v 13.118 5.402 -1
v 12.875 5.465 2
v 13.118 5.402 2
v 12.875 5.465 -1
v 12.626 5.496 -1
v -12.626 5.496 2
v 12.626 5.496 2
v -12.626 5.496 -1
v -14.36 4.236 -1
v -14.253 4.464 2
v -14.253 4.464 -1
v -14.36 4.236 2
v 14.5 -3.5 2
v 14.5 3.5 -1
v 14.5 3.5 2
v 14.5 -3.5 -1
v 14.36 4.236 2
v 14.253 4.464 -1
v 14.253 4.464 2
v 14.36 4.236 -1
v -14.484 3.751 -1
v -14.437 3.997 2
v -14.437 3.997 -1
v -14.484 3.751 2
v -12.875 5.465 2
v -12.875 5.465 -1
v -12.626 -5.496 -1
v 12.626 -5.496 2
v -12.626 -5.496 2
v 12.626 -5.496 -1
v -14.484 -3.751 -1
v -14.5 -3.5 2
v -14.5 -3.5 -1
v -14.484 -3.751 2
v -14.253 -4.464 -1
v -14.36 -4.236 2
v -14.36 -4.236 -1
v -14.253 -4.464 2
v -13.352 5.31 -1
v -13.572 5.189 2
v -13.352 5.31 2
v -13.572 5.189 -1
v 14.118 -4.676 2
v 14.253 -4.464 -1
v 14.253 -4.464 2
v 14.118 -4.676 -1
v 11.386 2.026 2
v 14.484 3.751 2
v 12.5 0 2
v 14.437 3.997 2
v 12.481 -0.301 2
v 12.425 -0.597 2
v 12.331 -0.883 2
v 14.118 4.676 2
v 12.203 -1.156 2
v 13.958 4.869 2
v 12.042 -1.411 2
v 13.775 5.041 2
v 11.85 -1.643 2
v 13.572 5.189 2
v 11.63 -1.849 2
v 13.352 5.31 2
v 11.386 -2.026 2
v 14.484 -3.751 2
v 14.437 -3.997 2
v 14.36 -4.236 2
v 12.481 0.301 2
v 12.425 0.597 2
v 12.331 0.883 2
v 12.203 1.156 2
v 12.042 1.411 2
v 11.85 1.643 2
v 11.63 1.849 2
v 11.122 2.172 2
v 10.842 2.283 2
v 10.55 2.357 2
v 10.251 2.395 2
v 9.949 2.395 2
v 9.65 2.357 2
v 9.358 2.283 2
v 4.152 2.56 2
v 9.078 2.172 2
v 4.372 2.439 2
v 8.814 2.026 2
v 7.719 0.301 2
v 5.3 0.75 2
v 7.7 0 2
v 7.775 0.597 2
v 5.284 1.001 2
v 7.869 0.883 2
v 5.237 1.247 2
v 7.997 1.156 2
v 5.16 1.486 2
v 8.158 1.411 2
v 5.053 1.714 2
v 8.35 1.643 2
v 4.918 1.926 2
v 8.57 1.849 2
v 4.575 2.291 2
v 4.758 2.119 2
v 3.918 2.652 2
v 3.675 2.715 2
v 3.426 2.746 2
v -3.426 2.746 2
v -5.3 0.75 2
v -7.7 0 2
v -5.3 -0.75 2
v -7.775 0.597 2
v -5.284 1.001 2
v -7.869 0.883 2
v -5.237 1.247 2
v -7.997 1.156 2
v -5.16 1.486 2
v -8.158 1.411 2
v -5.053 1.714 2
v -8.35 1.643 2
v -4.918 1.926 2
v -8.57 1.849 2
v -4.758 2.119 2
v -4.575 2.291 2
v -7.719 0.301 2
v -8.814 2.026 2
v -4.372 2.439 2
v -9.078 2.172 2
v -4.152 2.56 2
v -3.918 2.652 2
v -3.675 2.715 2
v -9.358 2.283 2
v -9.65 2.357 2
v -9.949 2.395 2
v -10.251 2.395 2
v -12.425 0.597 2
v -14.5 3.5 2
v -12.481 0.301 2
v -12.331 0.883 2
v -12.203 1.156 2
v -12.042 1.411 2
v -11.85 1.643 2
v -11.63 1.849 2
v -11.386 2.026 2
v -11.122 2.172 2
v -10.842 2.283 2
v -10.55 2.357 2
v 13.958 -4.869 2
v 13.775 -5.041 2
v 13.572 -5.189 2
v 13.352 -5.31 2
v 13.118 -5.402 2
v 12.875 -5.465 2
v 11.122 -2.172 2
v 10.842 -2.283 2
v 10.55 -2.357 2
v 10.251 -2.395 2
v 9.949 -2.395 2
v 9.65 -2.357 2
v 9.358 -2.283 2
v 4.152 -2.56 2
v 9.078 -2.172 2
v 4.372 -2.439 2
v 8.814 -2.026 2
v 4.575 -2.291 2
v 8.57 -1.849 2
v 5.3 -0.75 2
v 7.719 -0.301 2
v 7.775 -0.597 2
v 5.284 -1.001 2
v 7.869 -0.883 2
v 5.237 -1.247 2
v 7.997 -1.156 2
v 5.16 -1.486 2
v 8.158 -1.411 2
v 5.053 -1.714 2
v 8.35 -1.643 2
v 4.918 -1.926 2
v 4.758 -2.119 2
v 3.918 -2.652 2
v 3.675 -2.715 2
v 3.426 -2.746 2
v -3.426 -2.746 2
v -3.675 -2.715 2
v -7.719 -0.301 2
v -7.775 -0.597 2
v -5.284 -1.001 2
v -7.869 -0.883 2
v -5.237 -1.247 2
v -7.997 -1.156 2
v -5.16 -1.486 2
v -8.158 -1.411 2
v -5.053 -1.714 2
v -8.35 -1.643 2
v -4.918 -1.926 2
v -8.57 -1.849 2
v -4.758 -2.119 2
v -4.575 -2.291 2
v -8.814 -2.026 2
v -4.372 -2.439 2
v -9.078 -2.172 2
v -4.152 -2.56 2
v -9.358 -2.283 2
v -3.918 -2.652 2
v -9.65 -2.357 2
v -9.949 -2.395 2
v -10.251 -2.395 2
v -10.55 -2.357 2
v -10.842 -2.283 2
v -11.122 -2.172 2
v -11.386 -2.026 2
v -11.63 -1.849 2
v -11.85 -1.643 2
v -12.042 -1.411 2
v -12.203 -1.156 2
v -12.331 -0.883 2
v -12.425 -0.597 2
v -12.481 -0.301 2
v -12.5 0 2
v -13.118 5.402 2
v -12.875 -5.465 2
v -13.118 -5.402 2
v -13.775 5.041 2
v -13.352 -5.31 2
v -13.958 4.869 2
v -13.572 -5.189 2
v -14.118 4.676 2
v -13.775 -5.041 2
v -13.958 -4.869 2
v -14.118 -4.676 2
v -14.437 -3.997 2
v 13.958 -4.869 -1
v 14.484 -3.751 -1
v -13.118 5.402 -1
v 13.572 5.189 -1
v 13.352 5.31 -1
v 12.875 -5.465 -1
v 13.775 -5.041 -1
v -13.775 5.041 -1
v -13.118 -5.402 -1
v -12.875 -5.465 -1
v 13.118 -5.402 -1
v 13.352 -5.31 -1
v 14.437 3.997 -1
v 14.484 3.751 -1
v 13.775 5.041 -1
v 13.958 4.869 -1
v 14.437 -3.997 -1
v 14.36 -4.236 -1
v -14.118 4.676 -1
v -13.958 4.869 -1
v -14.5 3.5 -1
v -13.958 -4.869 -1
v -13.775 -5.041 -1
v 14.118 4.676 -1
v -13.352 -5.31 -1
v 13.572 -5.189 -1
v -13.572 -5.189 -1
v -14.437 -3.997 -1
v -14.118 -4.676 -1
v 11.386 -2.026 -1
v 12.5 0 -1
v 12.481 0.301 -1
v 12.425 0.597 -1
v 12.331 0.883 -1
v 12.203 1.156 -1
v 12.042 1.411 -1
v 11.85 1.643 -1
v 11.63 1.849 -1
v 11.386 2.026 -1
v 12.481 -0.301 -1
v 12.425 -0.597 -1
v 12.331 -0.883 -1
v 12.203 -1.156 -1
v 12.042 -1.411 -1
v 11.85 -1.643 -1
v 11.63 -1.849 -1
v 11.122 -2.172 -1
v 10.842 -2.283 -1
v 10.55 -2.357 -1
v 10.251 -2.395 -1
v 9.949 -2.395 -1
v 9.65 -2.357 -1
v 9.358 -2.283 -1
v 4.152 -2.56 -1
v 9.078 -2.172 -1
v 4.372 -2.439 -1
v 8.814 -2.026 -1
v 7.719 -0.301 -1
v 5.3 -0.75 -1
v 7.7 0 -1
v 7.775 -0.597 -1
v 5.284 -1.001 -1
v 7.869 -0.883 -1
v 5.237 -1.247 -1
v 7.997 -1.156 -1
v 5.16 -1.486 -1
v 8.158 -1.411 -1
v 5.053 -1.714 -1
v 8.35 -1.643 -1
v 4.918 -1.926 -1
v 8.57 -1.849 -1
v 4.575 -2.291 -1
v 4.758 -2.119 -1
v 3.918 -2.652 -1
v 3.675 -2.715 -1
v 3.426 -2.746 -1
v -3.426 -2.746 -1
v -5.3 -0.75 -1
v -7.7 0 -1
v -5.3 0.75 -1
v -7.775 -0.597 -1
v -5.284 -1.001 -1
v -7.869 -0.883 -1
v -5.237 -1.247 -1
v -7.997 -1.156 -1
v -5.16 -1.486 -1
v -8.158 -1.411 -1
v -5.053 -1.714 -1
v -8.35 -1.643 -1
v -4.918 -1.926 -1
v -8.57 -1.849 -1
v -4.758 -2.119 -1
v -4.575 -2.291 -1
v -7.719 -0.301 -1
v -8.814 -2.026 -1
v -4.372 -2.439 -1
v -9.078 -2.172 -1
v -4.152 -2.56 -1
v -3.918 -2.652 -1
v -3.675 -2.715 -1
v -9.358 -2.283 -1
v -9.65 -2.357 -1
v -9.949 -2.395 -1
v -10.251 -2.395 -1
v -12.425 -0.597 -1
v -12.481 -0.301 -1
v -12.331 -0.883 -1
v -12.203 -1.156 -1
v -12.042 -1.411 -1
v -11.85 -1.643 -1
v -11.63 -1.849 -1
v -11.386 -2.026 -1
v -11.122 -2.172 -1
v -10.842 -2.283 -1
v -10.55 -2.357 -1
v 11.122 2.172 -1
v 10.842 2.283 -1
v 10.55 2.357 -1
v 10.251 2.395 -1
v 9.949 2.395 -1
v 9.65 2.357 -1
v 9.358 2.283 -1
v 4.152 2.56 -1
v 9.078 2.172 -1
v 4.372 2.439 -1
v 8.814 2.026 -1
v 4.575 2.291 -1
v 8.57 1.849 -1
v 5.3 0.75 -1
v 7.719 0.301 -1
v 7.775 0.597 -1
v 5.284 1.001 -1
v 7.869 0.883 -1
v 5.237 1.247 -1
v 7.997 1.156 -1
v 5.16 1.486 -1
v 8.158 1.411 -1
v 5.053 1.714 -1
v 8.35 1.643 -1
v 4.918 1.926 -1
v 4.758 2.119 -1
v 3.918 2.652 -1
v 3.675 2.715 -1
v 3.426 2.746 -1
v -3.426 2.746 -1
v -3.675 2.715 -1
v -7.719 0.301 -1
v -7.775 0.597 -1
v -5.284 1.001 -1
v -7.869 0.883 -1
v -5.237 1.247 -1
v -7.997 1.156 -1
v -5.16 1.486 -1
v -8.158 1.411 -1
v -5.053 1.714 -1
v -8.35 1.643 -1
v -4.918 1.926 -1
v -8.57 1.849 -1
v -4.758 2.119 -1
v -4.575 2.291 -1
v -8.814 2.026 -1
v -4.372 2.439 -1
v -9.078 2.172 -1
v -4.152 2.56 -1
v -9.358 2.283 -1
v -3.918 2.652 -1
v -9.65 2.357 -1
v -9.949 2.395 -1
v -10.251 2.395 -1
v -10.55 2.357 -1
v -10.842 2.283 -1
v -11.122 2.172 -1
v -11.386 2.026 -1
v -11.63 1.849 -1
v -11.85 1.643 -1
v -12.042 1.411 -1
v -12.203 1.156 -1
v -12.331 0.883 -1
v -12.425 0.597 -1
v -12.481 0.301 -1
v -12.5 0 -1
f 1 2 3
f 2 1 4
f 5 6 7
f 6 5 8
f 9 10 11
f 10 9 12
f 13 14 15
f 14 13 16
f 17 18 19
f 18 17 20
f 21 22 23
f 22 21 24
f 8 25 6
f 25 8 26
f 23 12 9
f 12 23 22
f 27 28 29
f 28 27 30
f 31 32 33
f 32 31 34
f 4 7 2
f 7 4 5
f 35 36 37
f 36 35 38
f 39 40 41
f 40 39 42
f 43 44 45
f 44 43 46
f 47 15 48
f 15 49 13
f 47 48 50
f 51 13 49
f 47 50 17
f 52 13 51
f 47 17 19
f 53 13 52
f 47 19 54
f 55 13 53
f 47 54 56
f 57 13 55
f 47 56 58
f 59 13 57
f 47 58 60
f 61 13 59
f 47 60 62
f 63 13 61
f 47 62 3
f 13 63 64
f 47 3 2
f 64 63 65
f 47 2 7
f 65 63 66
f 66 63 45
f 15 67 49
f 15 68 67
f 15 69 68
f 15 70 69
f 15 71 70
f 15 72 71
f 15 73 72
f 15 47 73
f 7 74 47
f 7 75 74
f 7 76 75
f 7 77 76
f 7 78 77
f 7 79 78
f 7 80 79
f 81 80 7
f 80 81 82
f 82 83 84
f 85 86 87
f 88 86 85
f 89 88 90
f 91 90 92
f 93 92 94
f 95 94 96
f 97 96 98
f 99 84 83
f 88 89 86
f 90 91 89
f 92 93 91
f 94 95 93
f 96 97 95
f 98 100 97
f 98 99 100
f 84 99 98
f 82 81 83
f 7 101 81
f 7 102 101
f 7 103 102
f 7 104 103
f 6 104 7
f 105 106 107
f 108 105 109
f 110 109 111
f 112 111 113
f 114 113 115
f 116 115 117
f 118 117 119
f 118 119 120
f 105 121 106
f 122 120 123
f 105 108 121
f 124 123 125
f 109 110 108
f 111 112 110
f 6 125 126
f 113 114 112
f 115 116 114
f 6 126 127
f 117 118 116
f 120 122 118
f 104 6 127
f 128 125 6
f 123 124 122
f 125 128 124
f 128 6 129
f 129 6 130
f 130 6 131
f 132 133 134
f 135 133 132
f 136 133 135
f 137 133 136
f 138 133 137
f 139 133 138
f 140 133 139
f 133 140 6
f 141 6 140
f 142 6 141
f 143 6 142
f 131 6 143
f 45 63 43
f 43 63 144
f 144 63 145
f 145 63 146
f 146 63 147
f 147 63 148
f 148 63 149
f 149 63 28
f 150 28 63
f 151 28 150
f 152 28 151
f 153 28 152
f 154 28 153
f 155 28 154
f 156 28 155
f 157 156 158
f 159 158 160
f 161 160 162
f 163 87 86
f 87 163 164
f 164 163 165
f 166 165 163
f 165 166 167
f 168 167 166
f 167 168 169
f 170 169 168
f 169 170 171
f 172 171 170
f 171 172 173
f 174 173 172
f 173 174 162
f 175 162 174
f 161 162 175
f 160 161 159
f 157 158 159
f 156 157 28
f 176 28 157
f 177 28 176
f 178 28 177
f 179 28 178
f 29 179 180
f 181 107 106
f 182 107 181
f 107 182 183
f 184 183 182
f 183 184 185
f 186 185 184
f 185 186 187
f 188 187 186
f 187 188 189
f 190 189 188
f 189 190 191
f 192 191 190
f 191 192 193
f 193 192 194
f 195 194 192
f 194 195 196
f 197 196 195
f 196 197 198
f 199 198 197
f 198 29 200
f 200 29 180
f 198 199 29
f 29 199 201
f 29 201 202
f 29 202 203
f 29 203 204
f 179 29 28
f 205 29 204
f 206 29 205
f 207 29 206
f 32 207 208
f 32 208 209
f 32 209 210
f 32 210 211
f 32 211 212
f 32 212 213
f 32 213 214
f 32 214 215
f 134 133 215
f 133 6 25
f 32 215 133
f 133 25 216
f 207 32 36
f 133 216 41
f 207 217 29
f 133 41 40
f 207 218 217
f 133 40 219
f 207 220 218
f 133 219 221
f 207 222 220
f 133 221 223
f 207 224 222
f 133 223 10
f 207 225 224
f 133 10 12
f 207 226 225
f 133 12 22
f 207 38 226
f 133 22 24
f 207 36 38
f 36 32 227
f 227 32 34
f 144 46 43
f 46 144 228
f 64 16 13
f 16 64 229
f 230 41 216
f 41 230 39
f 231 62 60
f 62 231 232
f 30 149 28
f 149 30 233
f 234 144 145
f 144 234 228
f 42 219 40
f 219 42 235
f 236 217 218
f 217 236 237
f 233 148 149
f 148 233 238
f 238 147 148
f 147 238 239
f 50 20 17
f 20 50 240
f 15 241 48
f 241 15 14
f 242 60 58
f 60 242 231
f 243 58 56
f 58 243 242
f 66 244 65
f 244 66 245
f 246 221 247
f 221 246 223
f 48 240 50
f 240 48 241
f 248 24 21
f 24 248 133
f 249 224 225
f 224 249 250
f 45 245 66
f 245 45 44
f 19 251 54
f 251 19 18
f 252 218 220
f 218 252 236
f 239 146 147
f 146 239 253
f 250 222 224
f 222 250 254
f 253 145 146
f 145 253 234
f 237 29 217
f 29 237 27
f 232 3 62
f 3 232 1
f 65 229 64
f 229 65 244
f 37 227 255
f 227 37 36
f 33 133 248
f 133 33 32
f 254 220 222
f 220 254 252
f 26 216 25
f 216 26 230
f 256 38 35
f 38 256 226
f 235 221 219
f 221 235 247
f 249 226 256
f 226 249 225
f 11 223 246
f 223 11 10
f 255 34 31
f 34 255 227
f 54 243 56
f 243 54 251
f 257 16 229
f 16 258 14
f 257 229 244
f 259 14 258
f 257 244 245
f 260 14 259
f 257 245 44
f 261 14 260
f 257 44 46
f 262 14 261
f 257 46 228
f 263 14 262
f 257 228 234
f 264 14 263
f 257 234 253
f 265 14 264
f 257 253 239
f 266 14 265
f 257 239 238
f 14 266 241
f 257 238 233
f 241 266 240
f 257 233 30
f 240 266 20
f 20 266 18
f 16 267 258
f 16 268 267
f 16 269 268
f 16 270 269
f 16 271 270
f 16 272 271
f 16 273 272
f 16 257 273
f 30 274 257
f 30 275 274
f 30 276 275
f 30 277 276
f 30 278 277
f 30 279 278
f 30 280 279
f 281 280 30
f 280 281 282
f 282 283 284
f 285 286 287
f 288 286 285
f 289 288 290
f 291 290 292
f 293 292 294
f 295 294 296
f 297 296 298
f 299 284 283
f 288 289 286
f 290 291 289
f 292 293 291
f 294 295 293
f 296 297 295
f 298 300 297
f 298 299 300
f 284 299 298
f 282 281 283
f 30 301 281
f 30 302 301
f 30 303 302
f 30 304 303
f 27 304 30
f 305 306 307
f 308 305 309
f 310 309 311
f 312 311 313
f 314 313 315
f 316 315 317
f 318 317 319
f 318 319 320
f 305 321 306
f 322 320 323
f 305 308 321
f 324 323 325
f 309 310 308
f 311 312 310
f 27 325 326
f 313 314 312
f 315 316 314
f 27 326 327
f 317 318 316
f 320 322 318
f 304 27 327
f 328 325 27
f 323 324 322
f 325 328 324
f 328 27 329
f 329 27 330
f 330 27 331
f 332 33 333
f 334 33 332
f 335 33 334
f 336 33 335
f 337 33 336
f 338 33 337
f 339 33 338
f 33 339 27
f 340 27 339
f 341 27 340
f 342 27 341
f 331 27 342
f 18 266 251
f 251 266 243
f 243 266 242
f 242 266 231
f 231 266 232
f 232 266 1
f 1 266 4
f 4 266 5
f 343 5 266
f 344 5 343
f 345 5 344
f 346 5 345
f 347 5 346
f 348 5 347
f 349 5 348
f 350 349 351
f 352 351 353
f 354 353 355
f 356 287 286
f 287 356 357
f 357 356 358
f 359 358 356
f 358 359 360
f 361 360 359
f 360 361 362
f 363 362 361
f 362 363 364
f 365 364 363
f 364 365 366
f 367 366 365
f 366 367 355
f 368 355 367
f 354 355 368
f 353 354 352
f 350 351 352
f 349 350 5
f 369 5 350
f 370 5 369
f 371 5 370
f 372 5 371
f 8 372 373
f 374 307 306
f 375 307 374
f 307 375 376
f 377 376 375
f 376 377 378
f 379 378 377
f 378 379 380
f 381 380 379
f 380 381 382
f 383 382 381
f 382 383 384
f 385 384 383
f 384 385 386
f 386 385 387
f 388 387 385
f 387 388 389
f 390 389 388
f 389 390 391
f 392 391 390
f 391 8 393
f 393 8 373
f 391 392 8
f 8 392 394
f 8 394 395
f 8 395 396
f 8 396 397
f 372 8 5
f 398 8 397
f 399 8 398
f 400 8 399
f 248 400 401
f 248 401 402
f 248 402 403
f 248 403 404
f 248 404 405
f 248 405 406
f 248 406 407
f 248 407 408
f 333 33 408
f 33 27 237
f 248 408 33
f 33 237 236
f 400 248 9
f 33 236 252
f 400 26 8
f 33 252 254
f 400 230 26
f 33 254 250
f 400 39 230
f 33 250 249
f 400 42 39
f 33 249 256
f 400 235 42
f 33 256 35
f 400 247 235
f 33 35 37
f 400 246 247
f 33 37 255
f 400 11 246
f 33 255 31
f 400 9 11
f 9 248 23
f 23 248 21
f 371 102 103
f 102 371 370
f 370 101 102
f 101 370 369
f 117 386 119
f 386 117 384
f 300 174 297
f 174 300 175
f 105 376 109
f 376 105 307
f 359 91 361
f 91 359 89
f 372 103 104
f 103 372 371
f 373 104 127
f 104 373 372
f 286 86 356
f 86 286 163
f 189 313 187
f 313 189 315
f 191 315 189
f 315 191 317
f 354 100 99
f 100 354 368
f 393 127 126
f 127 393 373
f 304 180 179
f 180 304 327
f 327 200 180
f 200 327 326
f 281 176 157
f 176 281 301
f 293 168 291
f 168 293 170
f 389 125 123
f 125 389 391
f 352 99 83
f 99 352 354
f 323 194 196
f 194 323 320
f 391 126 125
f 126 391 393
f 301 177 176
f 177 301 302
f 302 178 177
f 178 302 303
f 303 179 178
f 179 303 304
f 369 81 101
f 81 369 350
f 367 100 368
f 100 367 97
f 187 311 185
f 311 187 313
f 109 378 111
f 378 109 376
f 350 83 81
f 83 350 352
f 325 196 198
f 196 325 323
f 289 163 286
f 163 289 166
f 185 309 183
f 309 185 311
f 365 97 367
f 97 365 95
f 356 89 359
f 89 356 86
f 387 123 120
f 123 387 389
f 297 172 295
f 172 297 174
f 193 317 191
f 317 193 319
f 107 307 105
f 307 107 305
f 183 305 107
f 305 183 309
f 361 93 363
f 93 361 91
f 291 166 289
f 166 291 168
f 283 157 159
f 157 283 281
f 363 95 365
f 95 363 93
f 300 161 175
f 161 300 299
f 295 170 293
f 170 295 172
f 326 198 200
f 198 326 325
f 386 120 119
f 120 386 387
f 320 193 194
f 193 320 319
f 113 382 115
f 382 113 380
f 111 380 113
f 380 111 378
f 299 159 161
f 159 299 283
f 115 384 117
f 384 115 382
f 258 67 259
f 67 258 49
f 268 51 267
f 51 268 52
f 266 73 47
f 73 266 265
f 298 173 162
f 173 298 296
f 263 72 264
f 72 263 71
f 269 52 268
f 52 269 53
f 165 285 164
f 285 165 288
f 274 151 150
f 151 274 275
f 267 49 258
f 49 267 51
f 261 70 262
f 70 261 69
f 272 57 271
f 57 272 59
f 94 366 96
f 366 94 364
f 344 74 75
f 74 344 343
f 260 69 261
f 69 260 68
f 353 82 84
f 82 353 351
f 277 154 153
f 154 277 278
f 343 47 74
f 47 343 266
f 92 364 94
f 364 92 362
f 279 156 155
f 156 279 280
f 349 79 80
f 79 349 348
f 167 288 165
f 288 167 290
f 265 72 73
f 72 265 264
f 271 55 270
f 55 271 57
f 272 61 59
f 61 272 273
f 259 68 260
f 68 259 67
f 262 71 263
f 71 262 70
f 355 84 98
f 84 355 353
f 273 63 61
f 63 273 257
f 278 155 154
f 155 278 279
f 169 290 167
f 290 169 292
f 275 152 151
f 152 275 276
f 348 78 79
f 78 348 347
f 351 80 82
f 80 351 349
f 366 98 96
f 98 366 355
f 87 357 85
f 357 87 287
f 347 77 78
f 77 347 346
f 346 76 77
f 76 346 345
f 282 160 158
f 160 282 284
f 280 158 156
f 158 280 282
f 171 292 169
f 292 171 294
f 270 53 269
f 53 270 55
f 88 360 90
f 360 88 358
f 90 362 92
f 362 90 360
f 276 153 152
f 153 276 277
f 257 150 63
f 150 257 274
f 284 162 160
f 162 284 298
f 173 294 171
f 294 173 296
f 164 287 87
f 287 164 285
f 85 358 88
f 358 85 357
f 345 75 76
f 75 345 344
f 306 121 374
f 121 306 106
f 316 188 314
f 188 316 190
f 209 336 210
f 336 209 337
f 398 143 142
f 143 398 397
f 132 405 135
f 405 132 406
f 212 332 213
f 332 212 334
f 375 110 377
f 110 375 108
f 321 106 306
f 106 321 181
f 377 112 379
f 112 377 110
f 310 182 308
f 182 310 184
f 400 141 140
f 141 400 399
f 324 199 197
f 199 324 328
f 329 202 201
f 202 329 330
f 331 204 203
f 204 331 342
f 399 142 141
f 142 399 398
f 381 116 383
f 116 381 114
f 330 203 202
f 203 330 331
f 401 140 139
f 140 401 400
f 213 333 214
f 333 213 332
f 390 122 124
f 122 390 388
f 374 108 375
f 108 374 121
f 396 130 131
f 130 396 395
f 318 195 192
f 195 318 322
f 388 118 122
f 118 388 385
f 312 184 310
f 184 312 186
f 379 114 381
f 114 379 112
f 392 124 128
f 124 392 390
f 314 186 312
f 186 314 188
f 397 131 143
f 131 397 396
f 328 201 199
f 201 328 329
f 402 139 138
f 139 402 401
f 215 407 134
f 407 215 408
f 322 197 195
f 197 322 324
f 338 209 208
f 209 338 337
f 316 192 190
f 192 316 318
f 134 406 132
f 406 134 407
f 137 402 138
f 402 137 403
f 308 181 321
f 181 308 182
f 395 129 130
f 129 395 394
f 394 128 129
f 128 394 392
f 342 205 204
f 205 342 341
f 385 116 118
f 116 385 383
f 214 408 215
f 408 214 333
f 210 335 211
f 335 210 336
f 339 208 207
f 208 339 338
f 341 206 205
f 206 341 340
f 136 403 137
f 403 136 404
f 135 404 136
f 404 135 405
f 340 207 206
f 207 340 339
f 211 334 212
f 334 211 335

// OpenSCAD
screwDiam = 4 + 2*0.4;
height = 2;
length = 25;
width = 7;
radius = 2;

$fn = 50;

difference() {
        minkowski() {
            cube([length, width, height], center = true);
            
            cylinder(r=radius,h=1);
        }

        minkowski() {
            cube([length - screwDiam * 3 - 4, width / 2 - 2, height], center = true);
            
            cylinder(r=radius,h=1);
        }

    translate([(length / 2) - screwDiam/2, 0 ,  0]) cylinder(d = screwDiam, h = height + 2, center = true);
    translate([(-length / 2) + screwDiam/2, 0 ,  0])cylinder(d = screwDiam, h = height + 2, center = true);
}
